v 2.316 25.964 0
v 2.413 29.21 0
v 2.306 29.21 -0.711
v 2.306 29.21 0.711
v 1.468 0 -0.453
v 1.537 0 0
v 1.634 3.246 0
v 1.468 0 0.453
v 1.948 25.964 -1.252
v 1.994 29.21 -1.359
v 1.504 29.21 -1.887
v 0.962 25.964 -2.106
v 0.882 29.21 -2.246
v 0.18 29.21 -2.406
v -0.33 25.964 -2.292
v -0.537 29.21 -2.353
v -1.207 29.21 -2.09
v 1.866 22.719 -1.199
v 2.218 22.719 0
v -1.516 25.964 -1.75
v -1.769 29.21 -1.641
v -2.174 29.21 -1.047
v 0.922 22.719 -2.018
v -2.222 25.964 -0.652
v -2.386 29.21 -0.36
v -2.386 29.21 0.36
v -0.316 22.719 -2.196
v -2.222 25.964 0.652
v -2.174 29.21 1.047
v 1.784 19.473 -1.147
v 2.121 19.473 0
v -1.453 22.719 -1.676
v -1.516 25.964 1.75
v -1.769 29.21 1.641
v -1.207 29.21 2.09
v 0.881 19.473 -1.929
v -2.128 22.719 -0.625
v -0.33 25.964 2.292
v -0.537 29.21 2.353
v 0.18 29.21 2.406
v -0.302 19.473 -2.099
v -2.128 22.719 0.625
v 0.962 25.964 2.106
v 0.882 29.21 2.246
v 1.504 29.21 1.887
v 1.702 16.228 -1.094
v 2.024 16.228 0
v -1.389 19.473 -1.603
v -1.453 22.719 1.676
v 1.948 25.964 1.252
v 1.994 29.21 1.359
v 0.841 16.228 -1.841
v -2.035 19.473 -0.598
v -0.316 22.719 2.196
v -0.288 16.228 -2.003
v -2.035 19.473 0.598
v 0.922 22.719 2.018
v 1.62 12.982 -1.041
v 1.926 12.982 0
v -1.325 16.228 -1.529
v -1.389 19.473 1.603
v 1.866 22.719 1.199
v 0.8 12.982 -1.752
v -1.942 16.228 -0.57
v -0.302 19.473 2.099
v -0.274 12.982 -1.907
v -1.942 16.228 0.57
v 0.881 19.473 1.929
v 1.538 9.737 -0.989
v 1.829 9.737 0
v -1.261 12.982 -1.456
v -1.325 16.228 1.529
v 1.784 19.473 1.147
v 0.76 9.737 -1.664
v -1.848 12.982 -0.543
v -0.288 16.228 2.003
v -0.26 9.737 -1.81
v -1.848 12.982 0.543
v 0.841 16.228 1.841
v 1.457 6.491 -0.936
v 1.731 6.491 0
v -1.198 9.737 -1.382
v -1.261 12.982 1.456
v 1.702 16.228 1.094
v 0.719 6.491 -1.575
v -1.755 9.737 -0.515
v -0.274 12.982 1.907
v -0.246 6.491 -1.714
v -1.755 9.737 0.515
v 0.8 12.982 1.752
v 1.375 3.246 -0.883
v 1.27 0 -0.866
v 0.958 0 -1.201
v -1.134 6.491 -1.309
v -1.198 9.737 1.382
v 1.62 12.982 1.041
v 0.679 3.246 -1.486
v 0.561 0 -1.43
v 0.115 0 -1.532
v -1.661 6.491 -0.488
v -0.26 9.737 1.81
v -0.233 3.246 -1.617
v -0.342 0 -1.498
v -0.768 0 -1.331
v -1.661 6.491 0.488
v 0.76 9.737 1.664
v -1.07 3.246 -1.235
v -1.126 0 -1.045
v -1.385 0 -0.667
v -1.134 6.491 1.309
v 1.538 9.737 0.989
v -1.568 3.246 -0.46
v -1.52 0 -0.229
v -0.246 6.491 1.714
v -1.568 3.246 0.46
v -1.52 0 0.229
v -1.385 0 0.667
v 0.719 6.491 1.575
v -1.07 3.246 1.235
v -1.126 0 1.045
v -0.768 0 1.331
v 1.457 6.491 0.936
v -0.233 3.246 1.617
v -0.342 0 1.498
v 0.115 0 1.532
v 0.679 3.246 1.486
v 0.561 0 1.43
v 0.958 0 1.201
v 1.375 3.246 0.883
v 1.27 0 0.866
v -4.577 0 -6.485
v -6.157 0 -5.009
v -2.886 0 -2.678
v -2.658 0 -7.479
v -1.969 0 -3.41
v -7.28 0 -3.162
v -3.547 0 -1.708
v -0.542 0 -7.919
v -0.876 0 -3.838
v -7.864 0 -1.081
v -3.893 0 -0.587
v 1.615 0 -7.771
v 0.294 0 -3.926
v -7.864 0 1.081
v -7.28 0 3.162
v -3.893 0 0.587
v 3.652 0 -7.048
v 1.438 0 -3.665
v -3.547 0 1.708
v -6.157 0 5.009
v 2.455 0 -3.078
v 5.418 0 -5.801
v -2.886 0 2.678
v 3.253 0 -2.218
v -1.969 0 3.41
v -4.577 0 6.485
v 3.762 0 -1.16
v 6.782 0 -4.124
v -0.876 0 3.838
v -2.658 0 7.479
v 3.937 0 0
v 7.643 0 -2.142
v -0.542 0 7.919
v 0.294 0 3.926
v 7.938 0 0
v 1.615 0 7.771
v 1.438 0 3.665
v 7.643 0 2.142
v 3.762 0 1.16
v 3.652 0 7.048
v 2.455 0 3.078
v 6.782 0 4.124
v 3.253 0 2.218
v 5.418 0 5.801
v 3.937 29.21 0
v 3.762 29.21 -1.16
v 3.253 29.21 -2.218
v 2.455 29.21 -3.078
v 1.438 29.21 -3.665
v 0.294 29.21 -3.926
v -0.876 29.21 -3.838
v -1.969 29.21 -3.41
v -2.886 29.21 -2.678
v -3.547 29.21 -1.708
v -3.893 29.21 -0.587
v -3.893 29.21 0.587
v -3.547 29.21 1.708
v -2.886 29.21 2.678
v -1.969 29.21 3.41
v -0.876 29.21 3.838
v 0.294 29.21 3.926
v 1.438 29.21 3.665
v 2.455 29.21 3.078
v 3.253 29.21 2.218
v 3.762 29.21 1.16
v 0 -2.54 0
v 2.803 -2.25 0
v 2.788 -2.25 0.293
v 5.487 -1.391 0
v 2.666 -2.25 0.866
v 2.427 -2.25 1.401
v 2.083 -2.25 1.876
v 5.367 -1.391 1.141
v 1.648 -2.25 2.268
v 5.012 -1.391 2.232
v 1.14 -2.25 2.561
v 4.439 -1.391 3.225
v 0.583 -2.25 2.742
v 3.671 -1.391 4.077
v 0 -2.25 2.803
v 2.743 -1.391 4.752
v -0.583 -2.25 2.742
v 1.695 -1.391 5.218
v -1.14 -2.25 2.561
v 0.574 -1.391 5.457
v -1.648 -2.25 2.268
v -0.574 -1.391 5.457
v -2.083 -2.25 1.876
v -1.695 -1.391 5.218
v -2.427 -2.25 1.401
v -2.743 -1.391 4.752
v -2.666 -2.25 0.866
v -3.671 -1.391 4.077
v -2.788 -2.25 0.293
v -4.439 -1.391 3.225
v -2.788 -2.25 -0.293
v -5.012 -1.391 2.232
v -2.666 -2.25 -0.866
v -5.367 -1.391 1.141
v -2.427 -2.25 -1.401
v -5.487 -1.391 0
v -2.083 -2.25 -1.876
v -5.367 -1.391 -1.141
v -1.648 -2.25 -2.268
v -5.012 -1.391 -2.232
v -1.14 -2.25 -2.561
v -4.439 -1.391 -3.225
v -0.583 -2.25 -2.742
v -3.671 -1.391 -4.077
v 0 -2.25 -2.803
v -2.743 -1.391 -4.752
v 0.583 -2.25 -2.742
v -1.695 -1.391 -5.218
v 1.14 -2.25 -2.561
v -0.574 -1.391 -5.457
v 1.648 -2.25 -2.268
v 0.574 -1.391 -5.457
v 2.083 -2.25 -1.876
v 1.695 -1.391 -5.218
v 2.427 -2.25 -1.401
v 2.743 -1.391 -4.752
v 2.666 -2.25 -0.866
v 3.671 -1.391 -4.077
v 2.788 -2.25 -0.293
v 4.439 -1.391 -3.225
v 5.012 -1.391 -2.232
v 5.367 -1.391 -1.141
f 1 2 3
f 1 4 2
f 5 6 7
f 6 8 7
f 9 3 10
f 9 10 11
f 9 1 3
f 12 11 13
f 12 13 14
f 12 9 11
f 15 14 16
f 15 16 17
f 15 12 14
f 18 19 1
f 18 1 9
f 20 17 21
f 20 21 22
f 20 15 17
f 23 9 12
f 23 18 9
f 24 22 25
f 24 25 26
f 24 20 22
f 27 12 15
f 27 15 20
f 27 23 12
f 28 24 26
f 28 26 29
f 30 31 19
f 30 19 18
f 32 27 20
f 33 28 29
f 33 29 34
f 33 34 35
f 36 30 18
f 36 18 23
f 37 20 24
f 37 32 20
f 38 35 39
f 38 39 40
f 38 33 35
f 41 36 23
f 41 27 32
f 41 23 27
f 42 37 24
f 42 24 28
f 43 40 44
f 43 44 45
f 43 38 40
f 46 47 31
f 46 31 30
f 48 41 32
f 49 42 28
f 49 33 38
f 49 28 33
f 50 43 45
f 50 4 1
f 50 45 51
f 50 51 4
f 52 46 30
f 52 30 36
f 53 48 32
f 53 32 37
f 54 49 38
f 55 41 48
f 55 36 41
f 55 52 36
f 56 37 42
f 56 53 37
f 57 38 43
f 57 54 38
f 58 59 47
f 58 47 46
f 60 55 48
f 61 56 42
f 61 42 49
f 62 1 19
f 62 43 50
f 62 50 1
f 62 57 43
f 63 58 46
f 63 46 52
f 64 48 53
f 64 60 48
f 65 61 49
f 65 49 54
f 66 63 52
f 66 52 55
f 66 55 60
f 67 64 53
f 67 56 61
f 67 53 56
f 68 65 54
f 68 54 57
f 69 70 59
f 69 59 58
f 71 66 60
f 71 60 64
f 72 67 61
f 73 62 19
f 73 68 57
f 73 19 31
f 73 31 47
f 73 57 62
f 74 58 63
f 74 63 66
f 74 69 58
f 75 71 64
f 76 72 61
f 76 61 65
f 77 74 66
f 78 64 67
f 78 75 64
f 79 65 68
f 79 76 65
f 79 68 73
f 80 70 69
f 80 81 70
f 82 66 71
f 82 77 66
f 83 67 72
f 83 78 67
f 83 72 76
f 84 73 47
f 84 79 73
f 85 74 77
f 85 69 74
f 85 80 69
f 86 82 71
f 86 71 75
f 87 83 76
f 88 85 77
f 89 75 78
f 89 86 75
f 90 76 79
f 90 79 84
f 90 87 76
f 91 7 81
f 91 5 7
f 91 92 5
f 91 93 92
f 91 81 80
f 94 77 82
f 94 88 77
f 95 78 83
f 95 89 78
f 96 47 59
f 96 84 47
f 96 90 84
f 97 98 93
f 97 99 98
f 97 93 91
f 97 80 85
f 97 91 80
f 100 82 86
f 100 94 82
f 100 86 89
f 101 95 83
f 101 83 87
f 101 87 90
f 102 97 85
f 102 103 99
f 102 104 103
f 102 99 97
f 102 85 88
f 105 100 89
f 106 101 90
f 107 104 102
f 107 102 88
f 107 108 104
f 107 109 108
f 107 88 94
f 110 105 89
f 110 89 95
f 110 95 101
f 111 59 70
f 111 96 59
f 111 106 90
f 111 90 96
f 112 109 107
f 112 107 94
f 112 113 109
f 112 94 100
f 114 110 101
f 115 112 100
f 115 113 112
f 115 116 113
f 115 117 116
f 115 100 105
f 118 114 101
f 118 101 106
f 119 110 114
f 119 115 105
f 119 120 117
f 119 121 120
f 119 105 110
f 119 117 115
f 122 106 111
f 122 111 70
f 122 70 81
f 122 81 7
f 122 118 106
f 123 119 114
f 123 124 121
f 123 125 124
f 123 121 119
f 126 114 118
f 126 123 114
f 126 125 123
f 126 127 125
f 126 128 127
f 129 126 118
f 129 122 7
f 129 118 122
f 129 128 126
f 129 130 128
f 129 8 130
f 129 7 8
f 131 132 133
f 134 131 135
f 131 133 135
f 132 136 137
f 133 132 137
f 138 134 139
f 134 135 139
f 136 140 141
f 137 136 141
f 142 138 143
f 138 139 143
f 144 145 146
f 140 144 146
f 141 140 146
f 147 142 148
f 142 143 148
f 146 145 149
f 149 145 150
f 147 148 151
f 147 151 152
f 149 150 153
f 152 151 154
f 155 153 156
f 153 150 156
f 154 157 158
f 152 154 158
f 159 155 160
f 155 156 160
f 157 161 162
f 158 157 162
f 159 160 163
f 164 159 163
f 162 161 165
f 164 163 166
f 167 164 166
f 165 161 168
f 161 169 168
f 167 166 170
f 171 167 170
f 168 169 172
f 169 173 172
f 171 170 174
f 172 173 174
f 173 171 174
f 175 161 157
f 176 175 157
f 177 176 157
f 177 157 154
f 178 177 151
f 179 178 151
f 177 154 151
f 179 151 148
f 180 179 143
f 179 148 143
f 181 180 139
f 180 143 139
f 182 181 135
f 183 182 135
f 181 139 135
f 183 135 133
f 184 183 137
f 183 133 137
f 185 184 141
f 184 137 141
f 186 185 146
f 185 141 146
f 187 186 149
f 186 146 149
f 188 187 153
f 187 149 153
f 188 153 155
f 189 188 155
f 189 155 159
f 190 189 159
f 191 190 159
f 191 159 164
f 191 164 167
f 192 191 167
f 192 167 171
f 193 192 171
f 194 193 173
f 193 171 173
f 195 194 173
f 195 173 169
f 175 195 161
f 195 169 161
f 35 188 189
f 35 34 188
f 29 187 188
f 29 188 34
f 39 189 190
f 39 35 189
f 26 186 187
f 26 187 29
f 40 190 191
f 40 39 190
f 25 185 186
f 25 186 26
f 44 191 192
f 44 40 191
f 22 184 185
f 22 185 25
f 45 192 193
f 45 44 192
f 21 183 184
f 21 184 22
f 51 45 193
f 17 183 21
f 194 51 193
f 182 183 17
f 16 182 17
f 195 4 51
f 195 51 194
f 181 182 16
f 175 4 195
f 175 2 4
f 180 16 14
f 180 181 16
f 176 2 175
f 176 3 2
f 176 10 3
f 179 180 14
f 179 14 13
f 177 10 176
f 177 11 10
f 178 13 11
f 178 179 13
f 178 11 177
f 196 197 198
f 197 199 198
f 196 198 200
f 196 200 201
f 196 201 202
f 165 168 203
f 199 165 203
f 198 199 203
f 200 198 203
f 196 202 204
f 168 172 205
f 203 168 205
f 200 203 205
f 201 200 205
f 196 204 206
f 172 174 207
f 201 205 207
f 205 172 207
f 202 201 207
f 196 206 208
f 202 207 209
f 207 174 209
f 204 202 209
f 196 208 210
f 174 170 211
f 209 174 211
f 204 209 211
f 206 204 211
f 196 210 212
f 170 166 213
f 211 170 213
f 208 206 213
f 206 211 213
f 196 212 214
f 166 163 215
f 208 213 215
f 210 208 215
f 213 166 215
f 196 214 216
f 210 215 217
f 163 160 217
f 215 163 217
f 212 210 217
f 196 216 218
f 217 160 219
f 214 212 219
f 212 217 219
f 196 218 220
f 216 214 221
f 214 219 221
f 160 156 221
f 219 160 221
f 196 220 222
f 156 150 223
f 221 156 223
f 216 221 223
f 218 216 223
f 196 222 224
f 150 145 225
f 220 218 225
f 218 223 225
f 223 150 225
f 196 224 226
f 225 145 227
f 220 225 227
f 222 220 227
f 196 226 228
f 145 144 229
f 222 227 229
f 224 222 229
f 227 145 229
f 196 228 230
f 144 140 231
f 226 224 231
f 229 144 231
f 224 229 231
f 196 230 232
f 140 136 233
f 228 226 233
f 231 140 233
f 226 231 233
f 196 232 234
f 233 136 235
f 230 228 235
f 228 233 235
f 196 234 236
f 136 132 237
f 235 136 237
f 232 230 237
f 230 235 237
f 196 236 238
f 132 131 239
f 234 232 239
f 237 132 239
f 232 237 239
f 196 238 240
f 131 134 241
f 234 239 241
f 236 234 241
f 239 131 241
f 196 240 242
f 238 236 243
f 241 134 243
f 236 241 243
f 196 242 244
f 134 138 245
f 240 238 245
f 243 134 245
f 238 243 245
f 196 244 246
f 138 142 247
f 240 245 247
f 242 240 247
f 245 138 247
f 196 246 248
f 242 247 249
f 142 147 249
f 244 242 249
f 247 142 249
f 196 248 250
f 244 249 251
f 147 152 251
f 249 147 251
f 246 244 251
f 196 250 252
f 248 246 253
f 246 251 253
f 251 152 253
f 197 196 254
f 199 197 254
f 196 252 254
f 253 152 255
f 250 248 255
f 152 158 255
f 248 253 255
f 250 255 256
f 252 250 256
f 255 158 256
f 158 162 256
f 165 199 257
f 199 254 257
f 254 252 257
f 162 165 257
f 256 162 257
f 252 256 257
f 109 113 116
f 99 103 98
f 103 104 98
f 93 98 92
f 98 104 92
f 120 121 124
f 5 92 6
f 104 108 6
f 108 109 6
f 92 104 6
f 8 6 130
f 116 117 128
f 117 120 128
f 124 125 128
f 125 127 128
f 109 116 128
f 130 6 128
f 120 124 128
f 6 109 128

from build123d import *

# Parameters (mm, degrees)
SKETCH1_R           = 3.937
SKETCH1_R_2         = 2.413
BOSS_EXTRUDE1_DEPTH = 29.21


with BuildPart() as part:
    # Sketch1 → Boss-Extrude1 (new body)
    with BuildSketch(Plane(origin=(0, 0, 0), x_dir=(1, 0, 0), z_dir=(0, 1, 0))):
        Circle(SKETCH1_R)
        Circle(SKETCH1_R_2, mode=Mode.SUBTRACT)
    extrude(amount=BOSS_EXTRUDE1_DEPTH)

    # Sketch2 one side → Revolve1 (revolve)
    with BuildSketch(Plane.XY):
        with BuildLine():
            ThreePointArc((0, -2.54), (4.166998508, -1.889526586), (7.9375, 0))
            Line((7.9375, 0), (0, 0))
            Line((0, 0), (0, -2.54))
        make_face()
    revolve(axis=Axis((0, 0, 0), (0, -1, 0)))

    # Sketch3 → Revolve2 (revolve)
    with BuildSketch(Plane.XY):
        Polygon((2.413, 16.51), (2.413, 29.21), (2.032, 16.51), align=None)
        Polygon((2.413, 0), (2.413, 16.51), (2.032, 16.51), (1.5367, 0), align=None)
    revolve(axis=Axis((0, 0, 0), (0, 1, 0)))


solid = part.part
